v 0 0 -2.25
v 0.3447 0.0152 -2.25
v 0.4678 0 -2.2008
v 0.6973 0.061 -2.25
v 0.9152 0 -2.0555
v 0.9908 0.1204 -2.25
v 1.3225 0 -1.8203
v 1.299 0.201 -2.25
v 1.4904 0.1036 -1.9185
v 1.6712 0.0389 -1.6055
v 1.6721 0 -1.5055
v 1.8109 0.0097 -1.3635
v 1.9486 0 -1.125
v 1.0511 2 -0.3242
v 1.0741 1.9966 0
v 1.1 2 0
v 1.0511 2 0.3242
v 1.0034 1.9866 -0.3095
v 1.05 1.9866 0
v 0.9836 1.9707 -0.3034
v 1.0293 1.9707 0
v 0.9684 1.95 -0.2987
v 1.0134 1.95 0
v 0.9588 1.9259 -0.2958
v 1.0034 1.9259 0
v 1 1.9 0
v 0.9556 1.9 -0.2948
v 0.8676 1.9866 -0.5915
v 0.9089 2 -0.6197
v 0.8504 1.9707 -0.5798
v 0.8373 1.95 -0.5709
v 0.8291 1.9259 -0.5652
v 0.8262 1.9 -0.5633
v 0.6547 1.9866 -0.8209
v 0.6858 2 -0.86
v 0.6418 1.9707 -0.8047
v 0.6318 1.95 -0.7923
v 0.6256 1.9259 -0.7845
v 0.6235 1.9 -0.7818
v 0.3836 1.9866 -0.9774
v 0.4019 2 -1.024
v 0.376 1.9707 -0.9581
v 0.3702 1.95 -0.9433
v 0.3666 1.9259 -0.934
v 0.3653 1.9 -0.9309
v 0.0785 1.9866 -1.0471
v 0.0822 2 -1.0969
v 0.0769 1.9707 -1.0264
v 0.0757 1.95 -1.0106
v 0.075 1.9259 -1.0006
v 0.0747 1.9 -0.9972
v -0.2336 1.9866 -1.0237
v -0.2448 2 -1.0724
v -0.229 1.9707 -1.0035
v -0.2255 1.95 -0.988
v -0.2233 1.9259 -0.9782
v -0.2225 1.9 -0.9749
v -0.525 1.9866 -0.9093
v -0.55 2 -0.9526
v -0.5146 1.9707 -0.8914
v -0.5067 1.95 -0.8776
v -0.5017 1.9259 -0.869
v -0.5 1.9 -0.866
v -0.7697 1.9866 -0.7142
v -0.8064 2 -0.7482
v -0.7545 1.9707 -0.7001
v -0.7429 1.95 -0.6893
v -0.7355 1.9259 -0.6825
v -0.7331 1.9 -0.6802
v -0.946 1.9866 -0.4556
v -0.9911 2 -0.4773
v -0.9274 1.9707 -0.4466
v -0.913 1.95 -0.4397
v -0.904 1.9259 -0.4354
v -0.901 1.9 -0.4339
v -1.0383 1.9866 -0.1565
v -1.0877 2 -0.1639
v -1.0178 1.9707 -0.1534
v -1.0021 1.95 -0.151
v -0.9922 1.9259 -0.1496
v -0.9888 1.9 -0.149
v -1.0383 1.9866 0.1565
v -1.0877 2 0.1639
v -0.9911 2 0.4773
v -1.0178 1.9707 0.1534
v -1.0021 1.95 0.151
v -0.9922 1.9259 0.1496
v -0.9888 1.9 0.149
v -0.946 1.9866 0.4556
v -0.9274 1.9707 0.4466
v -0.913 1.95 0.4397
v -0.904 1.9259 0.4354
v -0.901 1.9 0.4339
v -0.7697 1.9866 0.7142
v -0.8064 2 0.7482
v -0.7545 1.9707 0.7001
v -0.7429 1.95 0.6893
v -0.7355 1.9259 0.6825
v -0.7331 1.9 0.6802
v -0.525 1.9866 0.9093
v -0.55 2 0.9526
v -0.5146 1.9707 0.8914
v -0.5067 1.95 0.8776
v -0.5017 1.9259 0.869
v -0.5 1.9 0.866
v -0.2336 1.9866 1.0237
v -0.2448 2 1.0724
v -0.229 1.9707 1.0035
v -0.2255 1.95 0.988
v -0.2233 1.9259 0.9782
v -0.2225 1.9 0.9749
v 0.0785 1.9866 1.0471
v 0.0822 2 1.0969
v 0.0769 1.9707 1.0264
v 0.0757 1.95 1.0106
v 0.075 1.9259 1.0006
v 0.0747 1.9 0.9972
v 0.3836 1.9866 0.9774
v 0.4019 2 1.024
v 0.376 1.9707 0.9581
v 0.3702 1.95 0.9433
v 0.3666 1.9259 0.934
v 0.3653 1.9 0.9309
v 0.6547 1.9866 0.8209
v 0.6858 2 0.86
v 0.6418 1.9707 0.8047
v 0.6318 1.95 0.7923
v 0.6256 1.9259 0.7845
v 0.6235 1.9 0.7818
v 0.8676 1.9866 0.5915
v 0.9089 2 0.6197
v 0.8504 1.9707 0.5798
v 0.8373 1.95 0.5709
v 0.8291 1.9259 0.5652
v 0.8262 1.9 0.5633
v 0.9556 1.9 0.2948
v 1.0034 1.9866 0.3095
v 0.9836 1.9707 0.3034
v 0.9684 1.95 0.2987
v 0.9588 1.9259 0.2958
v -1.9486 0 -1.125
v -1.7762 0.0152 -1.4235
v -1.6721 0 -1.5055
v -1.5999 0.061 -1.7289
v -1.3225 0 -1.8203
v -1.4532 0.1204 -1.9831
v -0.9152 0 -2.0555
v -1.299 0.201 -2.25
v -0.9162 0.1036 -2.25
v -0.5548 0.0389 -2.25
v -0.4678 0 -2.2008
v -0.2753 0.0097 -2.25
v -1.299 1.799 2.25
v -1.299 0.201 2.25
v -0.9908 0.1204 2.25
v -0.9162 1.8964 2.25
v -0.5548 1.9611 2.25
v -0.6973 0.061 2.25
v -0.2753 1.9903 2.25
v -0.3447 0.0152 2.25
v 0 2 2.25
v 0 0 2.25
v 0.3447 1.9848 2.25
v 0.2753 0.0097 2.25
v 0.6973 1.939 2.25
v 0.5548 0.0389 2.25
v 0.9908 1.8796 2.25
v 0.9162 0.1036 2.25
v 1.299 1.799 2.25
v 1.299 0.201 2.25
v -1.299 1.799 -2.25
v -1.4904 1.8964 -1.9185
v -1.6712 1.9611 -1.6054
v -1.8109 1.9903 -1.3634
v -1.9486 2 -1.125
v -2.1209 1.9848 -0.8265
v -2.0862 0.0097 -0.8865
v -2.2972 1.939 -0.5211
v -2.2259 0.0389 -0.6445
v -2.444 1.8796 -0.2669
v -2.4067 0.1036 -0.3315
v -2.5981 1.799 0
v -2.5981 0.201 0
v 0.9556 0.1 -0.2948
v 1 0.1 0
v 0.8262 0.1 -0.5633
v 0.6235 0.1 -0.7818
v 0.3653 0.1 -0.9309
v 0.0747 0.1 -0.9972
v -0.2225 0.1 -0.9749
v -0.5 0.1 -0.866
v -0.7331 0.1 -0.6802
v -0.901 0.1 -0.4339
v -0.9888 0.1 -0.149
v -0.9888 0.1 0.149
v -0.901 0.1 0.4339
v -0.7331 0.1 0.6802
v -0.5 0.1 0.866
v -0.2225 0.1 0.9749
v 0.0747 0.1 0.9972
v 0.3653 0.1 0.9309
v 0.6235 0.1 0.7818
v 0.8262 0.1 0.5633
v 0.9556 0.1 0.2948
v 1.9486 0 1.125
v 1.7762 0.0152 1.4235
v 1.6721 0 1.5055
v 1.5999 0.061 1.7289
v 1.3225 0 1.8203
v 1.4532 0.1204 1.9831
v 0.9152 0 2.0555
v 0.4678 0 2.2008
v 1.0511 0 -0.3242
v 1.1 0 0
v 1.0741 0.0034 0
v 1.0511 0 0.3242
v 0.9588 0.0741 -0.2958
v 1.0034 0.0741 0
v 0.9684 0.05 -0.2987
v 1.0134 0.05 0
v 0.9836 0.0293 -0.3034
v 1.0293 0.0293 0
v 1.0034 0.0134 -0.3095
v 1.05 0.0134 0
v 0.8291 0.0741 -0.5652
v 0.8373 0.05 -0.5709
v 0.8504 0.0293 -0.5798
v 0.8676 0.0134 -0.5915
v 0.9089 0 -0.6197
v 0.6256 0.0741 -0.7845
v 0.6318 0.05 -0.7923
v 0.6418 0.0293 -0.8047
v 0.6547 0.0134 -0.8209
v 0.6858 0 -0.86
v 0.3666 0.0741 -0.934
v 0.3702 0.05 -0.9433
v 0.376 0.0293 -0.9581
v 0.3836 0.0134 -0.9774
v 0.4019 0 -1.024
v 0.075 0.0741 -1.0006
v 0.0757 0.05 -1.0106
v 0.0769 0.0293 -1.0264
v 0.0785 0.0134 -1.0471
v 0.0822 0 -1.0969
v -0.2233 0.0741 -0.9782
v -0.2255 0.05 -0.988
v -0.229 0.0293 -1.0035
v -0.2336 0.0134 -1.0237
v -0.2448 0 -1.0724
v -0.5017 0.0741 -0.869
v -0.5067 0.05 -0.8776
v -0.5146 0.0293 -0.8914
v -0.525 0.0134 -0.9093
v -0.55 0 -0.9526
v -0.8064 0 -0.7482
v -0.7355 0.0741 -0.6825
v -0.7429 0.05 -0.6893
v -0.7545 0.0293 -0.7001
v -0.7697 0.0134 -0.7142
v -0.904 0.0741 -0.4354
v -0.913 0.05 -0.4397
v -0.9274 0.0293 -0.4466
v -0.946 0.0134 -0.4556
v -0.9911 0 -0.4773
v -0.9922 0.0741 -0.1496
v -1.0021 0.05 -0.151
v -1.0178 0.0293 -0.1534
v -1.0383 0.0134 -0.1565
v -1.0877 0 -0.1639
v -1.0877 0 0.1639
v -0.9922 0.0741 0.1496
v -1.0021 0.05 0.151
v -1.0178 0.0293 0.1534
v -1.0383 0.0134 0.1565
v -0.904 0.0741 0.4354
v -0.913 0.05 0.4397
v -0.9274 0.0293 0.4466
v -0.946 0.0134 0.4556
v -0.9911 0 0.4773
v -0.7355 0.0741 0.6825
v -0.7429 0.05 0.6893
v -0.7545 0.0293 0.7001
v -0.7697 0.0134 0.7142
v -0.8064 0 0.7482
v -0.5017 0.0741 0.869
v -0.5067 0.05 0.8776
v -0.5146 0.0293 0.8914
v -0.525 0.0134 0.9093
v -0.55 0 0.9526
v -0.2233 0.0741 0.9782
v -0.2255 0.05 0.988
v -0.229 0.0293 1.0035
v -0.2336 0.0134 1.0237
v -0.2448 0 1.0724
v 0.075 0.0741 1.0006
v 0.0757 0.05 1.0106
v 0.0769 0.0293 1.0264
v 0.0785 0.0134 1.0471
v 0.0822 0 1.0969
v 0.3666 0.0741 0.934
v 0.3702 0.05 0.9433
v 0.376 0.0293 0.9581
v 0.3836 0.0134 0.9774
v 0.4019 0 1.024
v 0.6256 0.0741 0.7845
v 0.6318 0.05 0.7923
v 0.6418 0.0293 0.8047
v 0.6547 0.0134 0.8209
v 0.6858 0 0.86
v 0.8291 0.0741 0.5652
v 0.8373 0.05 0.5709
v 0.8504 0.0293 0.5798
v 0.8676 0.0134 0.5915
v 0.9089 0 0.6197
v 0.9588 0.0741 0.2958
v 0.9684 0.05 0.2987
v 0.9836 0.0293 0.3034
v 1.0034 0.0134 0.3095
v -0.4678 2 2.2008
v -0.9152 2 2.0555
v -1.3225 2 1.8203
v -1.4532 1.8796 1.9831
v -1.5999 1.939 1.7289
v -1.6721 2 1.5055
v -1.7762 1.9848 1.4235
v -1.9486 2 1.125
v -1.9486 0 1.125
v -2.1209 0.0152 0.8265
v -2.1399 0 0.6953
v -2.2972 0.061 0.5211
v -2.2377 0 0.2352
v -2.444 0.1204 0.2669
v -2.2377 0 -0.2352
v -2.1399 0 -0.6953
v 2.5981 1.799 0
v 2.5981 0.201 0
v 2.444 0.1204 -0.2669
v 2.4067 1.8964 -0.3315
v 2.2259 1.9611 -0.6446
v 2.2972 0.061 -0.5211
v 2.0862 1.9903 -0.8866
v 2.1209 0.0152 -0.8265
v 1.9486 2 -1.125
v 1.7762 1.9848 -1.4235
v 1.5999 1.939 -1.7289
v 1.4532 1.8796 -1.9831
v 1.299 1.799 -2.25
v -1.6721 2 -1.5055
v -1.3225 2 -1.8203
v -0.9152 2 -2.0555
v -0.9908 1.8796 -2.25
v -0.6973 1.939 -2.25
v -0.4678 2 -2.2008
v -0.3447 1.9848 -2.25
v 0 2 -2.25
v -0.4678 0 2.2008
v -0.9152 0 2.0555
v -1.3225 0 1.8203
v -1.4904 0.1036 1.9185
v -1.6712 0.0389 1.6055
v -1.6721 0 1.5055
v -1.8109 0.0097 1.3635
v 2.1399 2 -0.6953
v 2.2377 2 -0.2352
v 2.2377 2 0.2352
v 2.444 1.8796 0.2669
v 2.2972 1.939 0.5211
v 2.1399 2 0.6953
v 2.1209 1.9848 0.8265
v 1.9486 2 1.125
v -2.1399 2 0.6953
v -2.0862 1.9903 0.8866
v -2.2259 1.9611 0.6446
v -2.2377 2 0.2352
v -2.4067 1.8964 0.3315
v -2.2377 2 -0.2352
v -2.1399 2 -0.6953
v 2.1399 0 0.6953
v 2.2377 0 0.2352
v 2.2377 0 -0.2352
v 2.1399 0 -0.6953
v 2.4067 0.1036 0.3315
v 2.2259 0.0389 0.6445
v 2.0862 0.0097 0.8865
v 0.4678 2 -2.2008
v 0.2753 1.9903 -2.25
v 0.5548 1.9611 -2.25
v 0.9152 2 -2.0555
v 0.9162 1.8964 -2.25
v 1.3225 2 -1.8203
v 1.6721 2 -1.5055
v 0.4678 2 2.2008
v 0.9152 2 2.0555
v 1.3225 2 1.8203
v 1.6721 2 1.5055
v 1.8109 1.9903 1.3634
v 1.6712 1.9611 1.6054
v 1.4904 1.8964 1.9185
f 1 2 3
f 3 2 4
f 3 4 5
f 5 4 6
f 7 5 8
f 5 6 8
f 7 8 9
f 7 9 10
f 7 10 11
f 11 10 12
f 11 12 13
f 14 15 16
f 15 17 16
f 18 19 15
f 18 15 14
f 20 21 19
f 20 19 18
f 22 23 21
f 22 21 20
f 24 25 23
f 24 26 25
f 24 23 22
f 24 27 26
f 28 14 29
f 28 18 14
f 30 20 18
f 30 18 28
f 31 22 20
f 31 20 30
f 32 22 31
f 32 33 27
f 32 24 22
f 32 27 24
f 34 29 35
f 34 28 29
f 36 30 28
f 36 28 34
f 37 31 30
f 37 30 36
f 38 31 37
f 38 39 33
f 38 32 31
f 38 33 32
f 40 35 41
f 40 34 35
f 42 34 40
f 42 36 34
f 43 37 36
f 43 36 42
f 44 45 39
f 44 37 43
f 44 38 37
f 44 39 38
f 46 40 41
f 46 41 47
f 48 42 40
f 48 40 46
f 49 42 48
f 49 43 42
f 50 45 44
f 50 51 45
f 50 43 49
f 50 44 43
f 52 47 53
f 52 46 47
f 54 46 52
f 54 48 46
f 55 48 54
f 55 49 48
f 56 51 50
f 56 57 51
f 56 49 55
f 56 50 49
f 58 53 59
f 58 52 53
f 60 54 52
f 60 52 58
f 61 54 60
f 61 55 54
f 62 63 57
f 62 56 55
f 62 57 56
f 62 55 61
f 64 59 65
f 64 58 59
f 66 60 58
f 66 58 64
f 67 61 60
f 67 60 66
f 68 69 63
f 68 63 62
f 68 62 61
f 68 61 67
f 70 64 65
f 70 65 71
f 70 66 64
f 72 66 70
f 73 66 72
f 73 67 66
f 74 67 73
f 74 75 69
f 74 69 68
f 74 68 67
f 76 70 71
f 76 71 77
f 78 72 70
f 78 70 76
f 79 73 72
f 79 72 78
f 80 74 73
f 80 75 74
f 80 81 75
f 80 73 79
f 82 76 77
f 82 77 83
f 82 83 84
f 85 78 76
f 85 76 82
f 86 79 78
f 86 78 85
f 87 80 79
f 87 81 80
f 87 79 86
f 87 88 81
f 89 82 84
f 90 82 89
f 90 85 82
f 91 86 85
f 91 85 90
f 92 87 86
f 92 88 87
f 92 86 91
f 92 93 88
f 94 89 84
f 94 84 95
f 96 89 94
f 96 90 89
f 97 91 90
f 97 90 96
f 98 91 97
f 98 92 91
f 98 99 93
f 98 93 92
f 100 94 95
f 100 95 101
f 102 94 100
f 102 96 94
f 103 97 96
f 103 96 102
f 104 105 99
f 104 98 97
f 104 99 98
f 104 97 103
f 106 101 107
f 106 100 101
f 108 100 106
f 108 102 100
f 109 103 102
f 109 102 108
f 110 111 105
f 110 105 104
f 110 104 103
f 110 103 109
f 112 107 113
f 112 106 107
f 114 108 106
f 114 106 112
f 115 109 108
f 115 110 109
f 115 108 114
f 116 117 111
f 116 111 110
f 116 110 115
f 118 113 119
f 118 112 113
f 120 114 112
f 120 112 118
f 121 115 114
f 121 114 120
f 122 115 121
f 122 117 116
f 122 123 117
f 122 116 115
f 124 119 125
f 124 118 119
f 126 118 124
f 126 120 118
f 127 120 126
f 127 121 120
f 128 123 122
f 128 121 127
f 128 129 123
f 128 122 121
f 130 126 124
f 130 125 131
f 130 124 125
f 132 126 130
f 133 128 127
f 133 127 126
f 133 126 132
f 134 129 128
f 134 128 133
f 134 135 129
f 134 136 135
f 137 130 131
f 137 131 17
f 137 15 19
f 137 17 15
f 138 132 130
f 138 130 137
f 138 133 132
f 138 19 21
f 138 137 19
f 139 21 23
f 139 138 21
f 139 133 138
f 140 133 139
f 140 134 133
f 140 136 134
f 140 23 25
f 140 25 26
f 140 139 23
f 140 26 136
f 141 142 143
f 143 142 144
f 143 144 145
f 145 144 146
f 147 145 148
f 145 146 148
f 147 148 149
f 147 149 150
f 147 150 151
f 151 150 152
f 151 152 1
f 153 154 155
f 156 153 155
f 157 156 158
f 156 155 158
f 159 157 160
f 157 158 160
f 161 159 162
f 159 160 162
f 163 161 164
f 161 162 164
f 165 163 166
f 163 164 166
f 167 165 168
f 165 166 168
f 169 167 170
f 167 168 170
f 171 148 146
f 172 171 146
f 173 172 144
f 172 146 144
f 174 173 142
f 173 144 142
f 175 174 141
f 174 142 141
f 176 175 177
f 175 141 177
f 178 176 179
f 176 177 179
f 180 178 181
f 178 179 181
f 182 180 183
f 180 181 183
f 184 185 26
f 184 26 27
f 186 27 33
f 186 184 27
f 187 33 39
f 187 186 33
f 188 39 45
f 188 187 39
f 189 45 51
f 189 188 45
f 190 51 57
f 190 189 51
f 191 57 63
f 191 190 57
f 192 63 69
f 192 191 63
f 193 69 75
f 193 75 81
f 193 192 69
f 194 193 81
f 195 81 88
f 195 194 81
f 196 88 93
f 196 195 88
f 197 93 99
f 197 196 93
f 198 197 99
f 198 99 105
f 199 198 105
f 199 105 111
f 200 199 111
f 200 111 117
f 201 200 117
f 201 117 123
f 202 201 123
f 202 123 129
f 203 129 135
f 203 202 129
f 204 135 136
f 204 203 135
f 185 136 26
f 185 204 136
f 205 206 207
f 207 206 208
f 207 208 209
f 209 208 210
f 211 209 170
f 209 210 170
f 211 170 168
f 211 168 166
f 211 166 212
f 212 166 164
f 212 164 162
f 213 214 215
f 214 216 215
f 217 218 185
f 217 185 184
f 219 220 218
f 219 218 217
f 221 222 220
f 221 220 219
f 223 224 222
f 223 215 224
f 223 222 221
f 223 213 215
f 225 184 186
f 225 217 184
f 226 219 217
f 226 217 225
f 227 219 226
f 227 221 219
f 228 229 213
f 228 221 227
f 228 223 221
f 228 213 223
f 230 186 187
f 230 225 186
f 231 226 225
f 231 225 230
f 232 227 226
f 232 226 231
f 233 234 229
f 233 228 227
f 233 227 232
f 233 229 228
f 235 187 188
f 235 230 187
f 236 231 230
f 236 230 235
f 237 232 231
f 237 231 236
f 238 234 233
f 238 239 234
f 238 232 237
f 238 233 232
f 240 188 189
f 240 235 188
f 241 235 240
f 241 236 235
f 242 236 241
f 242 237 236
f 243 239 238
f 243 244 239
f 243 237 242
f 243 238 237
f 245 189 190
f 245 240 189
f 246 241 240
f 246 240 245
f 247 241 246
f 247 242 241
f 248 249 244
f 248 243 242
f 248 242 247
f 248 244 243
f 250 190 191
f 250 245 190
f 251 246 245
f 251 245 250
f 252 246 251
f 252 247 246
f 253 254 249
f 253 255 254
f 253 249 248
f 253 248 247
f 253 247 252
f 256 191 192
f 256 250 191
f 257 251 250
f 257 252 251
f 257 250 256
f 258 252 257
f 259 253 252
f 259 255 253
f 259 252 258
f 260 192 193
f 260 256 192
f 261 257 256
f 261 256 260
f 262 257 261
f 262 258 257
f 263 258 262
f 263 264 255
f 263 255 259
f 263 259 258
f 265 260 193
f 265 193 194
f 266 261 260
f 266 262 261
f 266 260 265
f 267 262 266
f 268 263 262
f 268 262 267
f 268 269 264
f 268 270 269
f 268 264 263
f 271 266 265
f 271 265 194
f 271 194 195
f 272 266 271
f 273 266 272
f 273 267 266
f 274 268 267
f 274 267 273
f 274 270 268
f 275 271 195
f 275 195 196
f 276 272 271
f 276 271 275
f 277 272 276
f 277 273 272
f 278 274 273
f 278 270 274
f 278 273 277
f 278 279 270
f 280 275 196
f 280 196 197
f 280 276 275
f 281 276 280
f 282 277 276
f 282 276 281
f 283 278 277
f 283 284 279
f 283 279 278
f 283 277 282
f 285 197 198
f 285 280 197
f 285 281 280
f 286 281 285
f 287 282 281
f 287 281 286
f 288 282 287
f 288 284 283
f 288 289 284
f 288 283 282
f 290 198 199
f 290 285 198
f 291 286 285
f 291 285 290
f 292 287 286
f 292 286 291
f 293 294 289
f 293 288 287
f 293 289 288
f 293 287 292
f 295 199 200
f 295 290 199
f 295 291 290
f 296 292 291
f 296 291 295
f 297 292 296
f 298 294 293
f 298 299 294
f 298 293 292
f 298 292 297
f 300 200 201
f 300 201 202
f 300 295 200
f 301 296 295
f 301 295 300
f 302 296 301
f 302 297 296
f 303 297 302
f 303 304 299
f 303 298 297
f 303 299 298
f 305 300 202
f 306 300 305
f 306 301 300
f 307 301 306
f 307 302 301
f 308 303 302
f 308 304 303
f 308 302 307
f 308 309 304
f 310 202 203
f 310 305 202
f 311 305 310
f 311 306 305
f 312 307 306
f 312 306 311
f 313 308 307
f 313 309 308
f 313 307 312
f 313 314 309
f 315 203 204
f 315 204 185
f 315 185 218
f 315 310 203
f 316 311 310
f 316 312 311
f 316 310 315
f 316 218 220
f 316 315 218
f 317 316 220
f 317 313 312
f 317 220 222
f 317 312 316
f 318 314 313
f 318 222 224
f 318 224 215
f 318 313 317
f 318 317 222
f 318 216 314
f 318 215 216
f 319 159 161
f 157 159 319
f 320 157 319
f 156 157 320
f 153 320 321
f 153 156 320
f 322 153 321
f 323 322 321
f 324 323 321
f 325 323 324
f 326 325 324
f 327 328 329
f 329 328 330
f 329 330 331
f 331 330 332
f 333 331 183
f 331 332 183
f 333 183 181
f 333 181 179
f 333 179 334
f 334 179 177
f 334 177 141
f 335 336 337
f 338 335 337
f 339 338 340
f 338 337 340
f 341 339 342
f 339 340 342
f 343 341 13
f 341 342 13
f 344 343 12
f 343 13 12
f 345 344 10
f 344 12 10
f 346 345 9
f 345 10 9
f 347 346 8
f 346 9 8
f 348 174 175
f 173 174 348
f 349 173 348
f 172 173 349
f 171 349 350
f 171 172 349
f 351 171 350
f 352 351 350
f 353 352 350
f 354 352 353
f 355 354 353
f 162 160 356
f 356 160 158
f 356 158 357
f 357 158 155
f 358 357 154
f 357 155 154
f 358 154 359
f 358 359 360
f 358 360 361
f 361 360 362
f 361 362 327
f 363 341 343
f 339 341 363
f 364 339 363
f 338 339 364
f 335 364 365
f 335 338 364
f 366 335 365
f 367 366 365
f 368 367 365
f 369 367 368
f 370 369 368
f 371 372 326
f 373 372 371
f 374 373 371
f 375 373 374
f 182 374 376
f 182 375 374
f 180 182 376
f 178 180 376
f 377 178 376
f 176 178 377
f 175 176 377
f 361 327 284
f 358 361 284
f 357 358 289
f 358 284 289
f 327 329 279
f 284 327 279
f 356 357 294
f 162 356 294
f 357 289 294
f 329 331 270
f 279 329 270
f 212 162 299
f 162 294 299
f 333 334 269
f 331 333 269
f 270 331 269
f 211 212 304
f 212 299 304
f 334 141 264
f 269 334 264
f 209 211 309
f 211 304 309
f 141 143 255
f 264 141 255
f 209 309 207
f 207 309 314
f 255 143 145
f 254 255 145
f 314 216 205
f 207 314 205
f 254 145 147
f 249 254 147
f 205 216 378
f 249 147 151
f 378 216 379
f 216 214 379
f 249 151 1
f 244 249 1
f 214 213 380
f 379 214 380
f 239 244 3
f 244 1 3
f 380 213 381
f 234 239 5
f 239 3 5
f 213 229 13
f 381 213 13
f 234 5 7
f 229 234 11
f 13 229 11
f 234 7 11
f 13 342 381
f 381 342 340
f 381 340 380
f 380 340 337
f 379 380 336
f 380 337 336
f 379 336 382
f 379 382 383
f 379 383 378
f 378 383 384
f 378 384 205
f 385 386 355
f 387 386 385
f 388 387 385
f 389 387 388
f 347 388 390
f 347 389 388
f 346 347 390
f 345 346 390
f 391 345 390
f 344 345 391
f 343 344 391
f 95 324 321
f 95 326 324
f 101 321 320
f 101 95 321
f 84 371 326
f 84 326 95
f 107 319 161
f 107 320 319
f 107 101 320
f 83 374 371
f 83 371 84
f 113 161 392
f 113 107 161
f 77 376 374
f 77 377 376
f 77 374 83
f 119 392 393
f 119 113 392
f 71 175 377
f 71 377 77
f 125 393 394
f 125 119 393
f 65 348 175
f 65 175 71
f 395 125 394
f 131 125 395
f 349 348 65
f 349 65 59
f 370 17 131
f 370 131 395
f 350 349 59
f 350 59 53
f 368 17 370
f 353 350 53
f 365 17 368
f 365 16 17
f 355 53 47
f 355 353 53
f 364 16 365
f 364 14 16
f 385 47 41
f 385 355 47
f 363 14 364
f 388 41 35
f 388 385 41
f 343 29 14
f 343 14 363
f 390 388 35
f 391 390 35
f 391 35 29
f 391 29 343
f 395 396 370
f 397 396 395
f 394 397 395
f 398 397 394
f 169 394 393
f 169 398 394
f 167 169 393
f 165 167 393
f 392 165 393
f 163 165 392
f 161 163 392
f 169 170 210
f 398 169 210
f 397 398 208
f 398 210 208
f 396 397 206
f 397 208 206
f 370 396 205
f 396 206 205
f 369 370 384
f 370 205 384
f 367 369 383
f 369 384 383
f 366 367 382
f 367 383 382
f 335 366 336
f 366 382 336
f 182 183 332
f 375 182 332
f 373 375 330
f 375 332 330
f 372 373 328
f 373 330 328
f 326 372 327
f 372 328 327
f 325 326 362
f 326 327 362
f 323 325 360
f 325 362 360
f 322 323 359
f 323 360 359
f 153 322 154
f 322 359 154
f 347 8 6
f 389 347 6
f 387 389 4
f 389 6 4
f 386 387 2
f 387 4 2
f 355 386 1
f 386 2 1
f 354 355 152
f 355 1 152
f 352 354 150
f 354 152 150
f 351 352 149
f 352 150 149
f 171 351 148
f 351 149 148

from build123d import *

# Parameters (mm, degrees)
SKETCH1_R           = 1
BOSS_EXTRUDE1_DEPTH = 2
SKETCH2_OUTSIDE_W   = 15.556
SKETCH2_OUTSIDE_H   = 14.86
SKETCH2_OUTSIDE_R   = 2.25
CUT_EXTRUDE2_DEPTH  = 2
CUT_EXTRUDE2_TAPER  = 60
SKETCH3_OUTSIDE_W   = 15.556
SKETCH3_OUTSIDE_H   = 14.86
SKETCH3_OUTSIDE_R   = 2.25
CUT_EXTRUDE3_DEPTH  = 2
CUT_EXTRUDE3_TAPER  = 60
FILLET2_R           = 0.1


with BuildPart() as part:
    # Sketch1 → Boss-Extrude1 (new body)
    with BuildSketch(Plane(origin=(0, 0, 0), x_dir=(1, 0, 0), z_dir=(0, 1, 0))):
        Polygon((2.598076211, 0), (1.299038106, 2.25), (-1.299038106, 2.25), (-2.598076211, 0), (-1.299038106, -2.25), (1.299038106, -2.25), align=None)
        Circle(SKETCH1_R, mode=Mode.SUBTRACT)
    extrude(amount=BOSS_EXTRUDE1_DEPTH)

    # Sketch2 outside → Cut-Extrude2 (cut)
    with BuildSketch(Plane(origin=(0, 0, 0), x_dir=(1, 0, 0), z_dir=(0, 1, 0))):
        Rectangle(SKETCH2_OUTSIDE_W, SKETCH2_OUTSIDE_H)
        Circle(SKETCH2_OUTSIDE_R, mode=Mode.SUBTRACT)
    extrude(amount=CUT_EXTRUDE2_DEPTH, taper=CUT_EXTRUDE2_TAPER, mode=Mode.SUBTRACT)

    # Sketch3 outside → Cut-Extrude3 (cut)
    with BuildSketch(Plane(origin=(0, 2, 0), x_dir=(1, 0, 0), z_dir=(0, 1, 0))):
        Rectangle(SKETCH3_OUTSIDE_W, SKETCH3_OUTSIDE_H)
        Circle(SKETCH3_OUTSIDE_R, mode=Mode.SUBTRACT)
    extrude(amount=-CUT_EXTRUDE3_DEPTH, taper=CUT_EXTRUDE3_TAPER, mode=Mode.SUBTRACT)

    # Fillet2
    fillet2_edges = [part.edges().sort_by_distance(p)[0] for p in [
        (-1, 0, 0),
        (-1, 2, 0),
    ]]
    fillet(fillet2_edges, radius=FILLET2_R)


solid = part.part
